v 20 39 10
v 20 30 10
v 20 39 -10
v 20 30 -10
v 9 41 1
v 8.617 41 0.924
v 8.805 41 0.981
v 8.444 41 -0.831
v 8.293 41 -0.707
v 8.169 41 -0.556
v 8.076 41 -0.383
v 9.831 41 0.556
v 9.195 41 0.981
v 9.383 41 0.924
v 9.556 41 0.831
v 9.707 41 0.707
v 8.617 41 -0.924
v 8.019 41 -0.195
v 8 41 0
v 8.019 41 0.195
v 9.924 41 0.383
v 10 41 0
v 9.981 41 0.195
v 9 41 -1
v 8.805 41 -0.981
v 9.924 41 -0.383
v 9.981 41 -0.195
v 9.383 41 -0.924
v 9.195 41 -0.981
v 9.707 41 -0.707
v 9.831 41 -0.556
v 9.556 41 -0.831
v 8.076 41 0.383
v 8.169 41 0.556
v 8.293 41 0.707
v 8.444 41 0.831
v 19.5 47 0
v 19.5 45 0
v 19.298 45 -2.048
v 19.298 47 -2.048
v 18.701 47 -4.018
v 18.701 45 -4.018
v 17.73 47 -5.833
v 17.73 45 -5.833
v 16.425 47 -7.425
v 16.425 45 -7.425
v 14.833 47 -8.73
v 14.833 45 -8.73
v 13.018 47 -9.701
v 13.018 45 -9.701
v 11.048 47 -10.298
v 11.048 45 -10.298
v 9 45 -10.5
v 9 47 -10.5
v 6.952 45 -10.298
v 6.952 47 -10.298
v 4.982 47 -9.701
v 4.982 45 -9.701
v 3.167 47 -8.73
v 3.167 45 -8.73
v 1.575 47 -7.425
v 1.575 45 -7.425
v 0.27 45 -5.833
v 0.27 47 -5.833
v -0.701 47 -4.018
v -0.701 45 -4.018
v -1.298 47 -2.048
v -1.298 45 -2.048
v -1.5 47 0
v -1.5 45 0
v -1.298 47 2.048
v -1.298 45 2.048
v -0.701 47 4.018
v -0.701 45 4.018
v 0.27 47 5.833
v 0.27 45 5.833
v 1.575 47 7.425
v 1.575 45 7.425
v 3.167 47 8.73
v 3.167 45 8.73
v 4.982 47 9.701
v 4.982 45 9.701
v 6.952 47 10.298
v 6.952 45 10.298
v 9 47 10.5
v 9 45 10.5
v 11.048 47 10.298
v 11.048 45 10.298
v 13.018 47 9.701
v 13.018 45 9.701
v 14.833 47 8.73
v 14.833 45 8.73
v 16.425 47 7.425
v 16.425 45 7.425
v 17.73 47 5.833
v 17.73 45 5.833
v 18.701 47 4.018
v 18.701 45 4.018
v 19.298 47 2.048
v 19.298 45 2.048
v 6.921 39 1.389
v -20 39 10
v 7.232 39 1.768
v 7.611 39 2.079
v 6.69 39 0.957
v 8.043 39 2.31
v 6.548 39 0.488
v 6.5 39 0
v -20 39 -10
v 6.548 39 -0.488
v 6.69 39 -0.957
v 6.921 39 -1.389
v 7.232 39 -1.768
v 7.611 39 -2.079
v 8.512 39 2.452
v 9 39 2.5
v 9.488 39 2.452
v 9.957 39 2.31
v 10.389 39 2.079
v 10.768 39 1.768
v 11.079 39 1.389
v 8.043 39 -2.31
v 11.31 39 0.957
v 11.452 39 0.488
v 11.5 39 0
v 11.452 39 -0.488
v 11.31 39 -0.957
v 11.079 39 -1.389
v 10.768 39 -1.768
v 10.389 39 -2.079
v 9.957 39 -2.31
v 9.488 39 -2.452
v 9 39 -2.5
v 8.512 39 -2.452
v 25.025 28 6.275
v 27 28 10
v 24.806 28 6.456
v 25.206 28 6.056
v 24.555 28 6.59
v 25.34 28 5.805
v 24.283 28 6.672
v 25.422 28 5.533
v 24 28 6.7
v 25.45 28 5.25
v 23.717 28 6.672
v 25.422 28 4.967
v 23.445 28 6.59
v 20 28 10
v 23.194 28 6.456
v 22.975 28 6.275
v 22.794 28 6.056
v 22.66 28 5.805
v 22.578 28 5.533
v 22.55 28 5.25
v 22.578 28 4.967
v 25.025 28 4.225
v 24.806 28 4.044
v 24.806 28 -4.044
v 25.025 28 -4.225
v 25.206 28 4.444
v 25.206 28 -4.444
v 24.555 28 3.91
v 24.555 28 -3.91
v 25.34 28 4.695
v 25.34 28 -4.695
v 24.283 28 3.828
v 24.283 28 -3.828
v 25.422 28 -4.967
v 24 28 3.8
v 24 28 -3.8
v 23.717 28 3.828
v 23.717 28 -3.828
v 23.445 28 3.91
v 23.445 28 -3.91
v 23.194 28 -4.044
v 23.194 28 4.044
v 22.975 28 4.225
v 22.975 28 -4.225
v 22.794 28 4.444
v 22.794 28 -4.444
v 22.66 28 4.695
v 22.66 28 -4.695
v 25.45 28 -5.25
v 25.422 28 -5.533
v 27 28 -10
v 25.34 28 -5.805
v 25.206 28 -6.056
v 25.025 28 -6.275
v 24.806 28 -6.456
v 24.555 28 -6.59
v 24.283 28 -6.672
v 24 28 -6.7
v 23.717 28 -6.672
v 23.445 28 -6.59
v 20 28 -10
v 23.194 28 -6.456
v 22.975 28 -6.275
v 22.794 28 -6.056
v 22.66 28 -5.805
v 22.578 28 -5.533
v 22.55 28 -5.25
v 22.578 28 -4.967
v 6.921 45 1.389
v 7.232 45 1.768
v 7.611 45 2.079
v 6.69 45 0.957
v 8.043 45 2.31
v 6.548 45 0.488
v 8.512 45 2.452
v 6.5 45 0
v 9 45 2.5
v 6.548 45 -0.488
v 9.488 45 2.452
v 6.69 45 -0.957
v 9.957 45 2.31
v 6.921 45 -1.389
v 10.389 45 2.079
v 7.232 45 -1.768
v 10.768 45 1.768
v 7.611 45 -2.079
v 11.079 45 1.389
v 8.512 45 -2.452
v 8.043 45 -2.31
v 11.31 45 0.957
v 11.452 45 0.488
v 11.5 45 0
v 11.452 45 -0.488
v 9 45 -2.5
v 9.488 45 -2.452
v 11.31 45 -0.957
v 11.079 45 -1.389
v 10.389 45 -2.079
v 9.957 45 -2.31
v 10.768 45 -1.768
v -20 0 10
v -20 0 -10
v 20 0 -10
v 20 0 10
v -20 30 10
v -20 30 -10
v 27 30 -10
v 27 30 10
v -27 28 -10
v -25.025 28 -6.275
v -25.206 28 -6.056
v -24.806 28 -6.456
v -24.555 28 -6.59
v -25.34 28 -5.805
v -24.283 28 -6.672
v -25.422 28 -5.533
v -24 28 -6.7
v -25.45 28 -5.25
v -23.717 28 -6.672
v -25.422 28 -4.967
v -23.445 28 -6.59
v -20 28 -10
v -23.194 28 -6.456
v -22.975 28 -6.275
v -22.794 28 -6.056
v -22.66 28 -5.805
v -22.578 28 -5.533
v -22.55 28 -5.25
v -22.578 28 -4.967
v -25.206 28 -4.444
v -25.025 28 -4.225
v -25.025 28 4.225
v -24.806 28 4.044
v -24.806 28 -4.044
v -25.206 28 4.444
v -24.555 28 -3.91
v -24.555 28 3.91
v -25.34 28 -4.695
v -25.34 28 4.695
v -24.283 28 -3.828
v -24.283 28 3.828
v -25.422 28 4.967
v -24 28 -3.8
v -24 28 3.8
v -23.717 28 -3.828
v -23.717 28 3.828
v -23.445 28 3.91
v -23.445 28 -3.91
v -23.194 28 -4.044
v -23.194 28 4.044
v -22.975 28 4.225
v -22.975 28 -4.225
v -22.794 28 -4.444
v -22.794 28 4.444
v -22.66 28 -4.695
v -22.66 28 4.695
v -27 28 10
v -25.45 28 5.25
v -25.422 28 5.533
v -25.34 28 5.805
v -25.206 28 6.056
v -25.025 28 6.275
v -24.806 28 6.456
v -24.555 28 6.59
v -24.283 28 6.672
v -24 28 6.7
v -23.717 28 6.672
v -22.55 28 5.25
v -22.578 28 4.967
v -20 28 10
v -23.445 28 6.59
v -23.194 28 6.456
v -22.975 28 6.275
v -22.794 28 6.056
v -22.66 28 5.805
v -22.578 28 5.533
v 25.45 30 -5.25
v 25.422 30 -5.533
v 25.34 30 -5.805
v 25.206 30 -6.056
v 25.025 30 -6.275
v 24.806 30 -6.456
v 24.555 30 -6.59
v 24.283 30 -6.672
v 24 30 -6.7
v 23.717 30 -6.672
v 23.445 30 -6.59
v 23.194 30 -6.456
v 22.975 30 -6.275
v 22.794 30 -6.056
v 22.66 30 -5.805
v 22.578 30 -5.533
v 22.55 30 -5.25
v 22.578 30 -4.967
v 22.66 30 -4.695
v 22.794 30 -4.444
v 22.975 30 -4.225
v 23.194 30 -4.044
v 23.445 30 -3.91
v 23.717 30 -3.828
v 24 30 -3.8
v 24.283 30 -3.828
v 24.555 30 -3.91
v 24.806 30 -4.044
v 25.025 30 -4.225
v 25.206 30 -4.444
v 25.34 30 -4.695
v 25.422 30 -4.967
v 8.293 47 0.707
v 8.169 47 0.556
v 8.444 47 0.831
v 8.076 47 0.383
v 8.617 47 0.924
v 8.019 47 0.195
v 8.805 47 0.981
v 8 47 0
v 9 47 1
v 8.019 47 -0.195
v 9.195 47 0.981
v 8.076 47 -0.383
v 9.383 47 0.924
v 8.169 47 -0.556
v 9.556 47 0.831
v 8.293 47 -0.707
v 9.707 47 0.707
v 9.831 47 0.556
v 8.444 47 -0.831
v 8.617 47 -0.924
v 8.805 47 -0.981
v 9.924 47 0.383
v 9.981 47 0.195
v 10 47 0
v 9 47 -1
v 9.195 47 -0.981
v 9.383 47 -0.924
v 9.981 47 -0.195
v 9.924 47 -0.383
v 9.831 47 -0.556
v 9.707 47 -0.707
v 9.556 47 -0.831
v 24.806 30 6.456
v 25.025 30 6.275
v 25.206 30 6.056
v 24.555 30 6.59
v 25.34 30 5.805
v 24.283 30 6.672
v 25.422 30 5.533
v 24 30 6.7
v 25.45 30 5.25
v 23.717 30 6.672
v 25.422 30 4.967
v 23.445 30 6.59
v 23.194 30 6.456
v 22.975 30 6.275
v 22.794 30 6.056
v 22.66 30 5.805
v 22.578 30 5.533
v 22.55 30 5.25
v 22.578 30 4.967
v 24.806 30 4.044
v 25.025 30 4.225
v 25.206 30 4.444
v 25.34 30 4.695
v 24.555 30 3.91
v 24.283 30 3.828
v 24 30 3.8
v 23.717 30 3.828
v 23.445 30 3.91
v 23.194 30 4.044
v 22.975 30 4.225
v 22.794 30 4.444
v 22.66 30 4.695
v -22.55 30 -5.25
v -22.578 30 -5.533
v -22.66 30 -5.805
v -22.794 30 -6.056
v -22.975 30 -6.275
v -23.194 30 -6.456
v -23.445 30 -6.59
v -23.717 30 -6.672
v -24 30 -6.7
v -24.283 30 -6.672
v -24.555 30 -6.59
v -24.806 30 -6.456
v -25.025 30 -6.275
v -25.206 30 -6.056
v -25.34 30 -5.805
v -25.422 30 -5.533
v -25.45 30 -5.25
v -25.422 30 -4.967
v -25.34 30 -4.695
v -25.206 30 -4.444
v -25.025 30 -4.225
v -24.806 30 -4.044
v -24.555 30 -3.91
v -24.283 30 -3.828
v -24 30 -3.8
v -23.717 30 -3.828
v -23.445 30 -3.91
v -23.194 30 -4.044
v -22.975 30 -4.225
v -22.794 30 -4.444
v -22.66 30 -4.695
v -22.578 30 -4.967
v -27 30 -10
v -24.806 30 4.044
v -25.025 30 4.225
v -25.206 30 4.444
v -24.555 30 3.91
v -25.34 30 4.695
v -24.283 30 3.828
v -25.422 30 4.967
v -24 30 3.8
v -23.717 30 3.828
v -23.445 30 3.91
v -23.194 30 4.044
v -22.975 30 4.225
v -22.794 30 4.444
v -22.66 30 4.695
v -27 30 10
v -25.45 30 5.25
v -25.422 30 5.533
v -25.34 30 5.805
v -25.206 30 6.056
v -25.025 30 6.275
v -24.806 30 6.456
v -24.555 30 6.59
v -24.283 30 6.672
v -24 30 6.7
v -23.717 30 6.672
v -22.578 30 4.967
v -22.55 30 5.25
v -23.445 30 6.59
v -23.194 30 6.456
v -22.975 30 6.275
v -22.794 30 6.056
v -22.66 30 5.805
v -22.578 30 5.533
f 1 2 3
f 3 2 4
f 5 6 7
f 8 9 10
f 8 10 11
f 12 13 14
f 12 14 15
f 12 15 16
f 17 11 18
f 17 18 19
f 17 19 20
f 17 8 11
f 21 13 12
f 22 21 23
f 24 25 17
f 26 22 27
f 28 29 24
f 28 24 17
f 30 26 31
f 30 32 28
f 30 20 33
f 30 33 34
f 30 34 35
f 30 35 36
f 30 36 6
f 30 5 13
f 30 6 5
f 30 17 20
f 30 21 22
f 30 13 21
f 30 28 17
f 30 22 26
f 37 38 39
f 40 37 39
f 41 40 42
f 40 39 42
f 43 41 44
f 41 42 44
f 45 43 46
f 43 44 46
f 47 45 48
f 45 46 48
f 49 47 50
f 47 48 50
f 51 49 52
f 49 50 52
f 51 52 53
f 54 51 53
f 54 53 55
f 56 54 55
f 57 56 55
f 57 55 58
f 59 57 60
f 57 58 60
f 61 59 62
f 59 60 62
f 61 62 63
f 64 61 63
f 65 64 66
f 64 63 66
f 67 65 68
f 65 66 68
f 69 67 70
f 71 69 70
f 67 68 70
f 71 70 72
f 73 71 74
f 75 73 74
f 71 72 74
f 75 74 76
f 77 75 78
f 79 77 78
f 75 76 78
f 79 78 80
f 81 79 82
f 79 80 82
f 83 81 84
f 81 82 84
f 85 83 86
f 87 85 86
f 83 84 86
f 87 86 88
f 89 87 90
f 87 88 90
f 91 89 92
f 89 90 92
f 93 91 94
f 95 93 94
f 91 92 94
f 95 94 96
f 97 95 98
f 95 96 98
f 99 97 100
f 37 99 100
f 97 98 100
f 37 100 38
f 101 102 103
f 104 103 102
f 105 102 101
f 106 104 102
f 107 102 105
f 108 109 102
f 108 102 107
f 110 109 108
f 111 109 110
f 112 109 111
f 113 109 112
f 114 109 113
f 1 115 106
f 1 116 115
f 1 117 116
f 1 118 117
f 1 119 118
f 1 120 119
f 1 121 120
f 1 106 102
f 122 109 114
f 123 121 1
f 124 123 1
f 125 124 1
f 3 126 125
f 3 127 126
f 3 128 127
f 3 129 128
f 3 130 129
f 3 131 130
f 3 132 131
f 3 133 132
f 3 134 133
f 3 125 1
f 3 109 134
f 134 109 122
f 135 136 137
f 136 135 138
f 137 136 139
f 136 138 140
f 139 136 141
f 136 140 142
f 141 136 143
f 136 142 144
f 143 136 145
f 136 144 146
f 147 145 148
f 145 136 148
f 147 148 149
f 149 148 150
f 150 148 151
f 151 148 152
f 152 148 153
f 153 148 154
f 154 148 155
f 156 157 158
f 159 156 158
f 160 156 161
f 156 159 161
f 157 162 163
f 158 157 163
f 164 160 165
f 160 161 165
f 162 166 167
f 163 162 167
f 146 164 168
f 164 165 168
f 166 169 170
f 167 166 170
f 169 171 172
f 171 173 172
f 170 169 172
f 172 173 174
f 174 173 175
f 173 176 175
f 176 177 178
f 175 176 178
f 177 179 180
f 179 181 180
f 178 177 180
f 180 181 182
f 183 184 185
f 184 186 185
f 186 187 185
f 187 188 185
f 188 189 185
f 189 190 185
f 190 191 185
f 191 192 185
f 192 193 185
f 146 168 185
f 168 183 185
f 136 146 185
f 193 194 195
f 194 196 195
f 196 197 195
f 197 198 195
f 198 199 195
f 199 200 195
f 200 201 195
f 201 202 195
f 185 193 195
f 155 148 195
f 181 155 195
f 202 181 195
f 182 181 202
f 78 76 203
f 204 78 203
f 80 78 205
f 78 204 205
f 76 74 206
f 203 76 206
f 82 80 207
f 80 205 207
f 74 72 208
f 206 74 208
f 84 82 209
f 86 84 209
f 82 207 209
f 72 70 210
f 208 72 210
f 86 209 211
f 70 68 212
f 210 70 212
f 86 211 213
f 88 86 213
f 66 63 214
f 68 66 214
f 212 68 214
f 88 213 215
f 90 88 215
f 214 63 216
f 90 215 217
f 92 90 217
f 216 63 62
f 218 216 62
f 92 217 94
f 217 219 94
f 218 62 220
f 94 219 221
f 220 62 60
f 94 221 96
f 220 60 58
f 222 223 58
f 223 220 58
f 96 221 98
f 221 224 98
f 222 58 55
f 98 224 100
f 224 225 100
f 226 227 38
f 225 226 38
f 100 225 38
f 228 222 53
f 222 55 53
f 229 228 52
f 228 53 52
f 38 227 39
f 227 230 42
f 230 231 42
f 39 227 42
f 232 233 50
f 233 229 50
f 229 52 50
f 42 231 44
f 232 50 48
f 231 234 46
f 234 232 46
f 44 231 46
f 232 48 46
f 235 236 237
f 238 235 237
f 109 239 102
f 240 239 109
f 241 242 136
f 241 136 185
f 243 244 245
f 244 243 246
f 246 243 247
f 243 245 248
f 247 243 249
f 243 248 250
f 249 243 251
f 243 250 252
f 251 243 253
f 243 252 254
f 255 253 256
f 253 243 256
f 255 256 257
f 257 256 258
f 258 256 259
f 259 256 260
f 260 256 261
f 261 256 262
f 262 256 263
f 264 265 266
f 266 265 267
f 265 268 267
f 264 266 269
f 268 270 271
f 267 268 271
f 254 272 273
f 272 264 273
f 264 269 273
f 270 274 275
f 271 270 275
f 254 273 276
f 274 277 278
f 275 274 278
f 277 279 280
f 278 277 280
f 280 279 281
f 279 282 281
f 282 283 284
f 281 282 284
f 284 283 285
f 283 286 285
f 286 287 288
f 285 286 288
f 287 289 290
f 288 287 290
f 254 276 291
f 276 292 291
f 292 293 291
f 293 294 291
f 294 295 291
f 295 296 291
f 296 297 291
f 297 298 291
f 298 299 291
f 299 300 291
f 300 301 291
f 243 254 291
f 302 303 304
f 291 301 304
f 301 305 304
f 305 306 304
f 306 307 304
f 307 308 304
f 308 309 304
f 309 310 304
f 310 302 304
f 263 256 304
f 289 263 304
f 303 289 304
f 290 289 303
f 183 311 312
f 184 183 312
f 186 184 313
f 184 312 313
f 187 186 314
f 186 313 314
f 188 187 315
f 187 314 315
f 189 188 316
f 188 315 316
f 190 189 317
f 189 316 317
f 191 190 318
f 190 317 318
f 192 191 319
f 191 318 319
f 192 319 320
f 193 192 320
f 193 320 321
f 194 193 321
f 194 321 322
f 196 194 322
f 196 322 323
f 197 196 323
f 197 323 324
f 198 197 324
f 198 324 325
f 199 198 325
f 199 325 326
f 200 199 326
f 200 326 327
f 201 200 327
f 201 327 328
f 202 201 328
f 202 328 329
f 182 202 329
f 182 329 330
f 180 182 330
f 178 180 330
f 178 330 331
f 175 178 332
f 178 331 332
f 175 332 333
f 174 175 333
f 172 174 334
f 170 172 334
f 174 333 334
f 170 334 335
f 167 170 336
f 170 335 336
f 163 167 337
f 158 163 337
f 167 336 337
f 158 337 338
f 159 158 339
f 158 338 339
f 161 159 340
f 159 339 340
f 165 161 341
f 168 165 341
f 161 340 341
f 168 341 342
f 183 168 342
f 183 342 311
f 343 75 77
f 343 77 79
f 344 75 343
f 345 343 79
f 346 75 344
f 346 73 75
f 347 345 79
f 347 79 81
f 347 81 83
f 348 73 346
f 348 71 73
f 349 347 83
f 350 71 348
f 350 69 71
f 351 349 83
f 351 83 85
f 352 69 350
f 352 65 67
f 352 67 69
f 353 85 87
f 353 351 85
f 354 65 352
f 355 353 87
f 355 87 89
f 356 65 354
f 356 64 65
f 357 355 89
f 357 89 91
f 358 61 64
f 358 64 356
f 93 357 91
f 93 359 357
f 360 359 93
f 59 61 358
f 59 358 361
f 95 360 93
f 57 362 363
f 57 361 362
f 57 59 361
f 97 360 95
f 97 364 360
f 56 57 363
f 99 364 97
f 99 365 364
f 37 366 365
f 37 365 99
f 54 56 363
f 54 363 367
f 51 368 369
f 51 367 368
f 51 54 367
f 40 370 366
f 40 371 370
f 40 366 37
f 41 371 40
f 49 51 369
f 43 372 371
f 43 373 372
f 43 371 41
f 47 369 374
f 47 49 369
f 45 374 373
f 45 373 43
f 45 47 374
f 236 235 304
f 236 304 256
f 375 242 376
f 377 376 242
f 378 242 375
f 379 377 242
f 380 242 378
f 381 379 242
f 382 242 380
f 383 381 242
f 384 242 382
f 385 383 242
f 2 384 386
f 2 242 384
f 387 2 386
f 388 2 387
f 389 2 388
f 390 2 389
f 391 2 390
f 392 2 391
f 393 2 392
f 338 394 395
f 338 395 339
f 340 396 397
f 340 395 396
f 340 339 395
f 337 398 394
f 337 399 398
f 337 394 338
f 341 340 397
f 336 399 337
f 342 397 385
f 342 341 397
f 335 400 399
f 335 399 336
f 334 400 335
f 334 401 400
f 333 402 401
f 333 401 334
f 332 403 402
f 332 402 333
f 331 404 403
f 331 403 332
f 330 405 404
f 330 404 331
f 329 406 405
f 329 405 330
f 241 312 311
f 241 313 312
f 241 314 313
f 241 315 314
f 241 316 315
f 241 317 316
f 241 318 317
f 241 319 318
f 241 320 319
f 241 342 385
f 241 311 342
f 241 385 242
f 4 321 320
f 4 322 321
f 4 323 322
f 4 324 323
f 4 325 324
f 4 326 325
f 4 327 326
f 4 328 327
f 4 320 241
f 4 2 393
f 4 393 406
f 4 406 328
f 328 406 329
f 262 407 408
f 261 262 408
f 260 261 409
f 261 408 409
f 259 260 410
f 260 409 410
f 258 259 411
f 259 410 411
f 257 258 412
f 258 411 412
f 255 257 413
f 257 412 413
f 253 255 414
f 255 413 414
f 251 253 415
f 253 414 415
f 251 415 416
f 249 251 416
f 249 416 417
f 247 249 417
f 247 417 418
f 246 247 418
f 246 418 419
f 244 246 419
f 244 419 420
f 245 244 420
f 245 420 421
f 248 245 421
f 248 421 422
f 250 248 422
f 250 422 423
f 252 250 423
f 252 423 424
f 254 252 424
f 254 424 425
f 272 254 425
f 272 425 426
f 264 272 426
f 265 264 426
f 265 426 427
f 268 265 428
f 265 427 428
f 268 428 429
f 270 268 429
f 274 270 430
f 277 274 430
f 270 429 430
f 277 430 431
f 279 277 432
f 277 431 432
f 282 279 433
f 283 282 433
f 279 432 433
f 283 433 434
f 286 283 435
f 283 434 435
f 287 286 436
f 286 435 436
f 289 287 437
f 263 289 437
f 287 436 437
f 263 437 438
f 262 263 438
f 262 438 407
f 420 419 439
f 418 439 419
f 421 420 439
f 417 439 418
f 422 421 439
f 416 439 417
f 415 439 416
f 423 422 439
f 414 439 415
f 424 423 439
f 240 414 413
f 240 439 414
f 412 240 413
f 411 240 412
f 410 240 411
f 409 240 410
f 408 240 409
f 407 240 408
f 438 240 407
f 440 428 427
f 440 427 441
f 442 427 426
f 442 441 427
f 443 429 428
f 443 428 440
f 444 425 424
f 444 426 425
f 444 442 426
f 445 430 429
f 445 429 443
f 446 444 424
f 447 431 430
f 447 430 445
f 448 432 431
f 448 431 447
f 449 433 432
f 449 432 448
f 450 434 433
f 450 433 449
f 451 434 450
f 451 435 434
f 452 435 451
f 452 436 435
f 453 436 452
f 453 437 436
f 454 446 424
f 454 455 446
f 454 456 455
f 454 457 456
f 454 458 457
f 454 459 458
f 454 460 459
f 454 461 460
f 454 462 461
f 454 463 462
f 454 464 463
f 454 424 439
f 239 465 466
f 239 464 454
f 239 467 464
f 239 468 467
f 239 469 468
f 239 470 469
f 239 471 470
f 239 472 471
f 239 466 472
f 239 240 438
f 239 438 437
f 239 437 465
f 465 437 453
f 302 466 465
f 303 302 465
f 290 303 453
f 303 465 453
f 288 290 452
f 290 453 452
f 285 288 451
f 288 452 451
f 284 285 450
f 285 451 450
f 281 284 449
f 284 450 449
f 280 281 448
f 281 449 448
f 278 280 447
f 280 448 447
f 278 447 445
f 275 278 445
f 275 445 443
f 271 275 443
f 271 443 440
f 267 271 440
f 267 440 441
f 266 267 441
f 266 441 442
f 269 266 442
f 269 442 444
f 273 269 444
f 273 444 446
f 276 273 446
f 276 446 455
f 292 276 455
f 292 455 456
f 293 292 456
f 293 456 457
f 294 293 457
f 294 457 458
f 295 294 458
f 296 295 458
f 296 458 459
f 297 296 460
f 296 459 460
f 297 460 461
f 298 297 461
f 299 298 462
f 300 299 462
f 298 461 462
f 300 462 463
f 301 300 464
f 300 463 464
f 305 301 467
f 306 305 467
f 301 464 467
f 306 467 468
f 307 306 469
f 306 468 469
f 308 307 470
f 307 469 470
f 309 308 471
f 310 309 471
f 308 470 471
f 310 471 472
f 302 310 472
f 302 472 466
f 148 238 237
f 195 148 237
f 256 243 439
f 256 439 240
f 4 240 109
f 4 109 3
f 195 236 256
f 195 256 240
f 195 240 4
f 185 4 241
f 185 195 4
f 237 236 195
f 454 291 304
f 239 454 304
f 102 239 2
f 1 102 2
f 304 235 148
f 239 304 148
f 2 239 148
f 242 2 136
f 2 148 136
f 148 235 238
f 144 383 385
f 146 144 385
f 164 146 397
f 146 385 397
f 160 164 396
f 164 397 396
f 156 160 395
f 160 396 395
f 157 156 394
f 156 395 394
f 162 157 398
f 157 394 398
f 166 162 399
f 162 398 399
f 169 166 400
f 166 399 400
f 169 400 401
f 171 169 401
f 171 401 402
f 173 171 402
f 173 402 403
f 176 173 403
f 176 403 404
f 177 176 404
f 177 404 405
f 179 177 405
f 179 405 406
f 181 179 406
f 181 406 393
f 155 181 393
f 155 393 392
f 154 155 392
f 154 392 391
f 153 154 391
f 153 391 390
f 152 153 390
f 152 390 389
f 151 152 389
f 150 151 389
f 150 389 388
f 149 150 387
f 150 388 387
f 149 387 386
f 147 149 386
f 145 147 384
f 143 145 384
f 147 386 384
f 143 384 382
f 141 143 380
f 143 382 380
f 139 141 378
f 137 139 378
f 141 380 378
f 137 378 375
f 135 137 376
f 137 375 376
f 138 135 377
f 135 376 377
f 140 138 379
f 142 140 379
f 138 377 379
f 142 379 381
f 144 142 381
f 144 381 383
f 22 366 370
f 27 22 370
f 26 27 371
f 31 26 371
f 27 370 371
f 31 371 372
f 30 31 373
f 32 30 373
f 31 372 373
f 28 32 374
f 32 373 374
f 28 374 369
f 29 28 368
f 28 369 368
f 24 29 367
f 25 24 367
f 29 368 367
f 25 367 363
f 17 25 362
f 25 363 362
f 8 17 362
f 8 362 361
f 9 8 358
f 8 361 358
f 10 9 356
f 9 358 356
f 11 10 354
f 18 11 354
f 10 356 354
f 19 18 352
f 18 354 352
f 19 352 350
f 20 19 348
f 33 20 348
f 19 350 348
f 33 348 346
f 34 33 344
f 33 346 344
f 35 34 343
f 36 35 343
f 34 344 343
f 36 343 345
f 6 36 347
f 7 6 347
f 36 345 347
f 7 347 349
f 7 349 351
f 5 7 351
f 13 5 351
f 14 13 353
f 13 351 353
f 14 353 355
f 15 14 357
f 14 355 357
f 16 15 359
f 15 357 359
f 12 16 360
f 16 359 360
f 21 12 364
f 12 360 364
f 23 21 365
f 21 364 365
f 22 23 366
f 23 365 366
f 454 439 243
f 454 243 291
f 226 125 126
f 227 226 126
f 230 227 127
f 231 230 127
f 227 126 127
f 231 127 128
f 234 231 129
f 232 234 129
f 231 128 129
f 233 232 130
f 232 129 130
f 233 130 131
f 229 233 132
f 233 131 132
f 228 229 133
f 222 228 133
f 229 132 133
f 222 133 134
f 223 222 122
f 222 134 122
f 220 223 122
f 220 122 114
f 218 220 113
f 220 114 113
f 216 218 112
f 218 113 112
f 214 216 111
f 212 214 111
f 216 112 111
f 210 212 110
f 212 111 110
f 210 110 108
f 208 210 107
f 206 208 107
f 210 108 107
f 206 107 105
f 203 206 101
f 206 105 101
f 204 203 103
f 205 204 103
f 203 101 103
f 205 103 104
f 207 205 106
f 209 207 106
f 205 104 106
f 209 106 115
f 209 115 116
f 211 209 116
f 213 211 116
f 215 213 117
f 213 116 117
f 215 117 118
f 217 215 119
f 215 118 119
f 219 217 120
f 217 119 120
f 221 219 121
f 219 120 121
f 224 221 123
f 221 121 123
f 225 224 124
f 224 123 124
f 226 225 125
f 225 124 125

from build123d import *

# Parameters (mm, degrees)
SKETCH1_W           = 40
SKETCH1_H           = 20
BOSS_EXTRUDE1_DEPTH = 39
SKETCH2_W           = 20
SKETCH2_H           = 2
BOSS_EXTRUDE2_DEPTH = 7
SKETCH3_W           = 20
SKETCH3_H           = 2
BOSS_EXTRUDE3_DEPTH = 7
SKETCH4_R           = 1.45
CUT_EXTRUDE1_DEPTH  = 31
SKETCH5_R           = 2.5
BOSS_EXTRUDE4_DEPTH = 6
SKETCH6_R           = 10.5
BOSS_EXTRUDE5_DEPTH = 2
SKETCH7_R           = 1
CUT_EXTRUDE3_DEPTH  = 6


with BuildPart() as part:
    # Sketch1 → Boss-Extrude1 (new body)
    with BuildSketch(Plane(origin=(0, 0, 0), x_dir=(1, 0, 0), z_dir=(0, 1, 0))):
        Rectangle(SKETCH1_W, SKETCH1_H)
    extrude(amount=BOSS_EXTRUDE1_DEPTH)

    # Sketch2 → Boss-Extrude2 (add)
    with BuildSketch(Plane(origin=(20, 0, 0), x_dir=(0, 0, -1), z_dir=(1, 0, 0))):
        with Locations((0, 29)):
            Rectangle(SKETCH2_W, SKETCH2_H)
    extrude(amount=BOSS_EXTRUDE2_DEPTH)

    # Sketch3 → Boss-Extrude3 (add)
    with BuildSketch(Plane.ZY.offset(20)):
        with Locations((0, 29)):
            Rectangle(SKETCH3_W, SKETCH3_H)
    extrude(amount=BOSS_EXTRUDE3_DEPTH)

    # Sketch4 → Cut-Extrude1 (cut, through all)
    with BuildSketch(Plane(origin=(0, 30, 0), x_dir=(1, 0, 0), z_dir=(0, 1, 0))):
        with Locations((24, 5.25)):
            Circle(SKETCH4_R)
        with Locations((24, -5.25)):
            Circle(SKETCH4_R)
        with Locations((-24, 5.25)):
            Circle(SKETCH4_R)
        with Locations((-24, -5.25)):
            Circle(SKETCH4_R)
    extrude(amount=-CUT_EXTRUDE1_DEPTH, mode=Mode.SUBTRACT)

    # Sketch5 → Boss-Extrude4 (add)
    with BuildSketch(Plane(origin=(0, 39, 0), x_dir=(1, 0, 0), z_dir=(0, 1, 0))):
        with Locations((9, 0)):
            Circle(SKETCH5_R)
    extrude(amount=BOSS_EXTRUDE4_DEPTH)

    # Sketch6 → Boss-Extrude5 (add)
    with BuildSketch(Plane(origin=(0, 45, 0), x_dir=(1, 0, 0), z_dir=(0, 1, 0))):
        with Locations((9, 0)):
            Circle(SKETCH6_R)
    extrude(amount=BOSS_EXTRUDE5_DEPTH)

    # Sketch7 → Cut-Extrude3 (cut)
    with BuildSketch(Plane(origin=(0, 47, 0), x_dir=(1, 0, 0), z_dir=(0, 1, 0))):
        with Locations((9, 0)):
            Circle(SKETCH7_R)
    extrude(amount=-CUT_EXTRUDE3_DEPTH, mode=Mode.SUBTRACT)


solid = part.part
